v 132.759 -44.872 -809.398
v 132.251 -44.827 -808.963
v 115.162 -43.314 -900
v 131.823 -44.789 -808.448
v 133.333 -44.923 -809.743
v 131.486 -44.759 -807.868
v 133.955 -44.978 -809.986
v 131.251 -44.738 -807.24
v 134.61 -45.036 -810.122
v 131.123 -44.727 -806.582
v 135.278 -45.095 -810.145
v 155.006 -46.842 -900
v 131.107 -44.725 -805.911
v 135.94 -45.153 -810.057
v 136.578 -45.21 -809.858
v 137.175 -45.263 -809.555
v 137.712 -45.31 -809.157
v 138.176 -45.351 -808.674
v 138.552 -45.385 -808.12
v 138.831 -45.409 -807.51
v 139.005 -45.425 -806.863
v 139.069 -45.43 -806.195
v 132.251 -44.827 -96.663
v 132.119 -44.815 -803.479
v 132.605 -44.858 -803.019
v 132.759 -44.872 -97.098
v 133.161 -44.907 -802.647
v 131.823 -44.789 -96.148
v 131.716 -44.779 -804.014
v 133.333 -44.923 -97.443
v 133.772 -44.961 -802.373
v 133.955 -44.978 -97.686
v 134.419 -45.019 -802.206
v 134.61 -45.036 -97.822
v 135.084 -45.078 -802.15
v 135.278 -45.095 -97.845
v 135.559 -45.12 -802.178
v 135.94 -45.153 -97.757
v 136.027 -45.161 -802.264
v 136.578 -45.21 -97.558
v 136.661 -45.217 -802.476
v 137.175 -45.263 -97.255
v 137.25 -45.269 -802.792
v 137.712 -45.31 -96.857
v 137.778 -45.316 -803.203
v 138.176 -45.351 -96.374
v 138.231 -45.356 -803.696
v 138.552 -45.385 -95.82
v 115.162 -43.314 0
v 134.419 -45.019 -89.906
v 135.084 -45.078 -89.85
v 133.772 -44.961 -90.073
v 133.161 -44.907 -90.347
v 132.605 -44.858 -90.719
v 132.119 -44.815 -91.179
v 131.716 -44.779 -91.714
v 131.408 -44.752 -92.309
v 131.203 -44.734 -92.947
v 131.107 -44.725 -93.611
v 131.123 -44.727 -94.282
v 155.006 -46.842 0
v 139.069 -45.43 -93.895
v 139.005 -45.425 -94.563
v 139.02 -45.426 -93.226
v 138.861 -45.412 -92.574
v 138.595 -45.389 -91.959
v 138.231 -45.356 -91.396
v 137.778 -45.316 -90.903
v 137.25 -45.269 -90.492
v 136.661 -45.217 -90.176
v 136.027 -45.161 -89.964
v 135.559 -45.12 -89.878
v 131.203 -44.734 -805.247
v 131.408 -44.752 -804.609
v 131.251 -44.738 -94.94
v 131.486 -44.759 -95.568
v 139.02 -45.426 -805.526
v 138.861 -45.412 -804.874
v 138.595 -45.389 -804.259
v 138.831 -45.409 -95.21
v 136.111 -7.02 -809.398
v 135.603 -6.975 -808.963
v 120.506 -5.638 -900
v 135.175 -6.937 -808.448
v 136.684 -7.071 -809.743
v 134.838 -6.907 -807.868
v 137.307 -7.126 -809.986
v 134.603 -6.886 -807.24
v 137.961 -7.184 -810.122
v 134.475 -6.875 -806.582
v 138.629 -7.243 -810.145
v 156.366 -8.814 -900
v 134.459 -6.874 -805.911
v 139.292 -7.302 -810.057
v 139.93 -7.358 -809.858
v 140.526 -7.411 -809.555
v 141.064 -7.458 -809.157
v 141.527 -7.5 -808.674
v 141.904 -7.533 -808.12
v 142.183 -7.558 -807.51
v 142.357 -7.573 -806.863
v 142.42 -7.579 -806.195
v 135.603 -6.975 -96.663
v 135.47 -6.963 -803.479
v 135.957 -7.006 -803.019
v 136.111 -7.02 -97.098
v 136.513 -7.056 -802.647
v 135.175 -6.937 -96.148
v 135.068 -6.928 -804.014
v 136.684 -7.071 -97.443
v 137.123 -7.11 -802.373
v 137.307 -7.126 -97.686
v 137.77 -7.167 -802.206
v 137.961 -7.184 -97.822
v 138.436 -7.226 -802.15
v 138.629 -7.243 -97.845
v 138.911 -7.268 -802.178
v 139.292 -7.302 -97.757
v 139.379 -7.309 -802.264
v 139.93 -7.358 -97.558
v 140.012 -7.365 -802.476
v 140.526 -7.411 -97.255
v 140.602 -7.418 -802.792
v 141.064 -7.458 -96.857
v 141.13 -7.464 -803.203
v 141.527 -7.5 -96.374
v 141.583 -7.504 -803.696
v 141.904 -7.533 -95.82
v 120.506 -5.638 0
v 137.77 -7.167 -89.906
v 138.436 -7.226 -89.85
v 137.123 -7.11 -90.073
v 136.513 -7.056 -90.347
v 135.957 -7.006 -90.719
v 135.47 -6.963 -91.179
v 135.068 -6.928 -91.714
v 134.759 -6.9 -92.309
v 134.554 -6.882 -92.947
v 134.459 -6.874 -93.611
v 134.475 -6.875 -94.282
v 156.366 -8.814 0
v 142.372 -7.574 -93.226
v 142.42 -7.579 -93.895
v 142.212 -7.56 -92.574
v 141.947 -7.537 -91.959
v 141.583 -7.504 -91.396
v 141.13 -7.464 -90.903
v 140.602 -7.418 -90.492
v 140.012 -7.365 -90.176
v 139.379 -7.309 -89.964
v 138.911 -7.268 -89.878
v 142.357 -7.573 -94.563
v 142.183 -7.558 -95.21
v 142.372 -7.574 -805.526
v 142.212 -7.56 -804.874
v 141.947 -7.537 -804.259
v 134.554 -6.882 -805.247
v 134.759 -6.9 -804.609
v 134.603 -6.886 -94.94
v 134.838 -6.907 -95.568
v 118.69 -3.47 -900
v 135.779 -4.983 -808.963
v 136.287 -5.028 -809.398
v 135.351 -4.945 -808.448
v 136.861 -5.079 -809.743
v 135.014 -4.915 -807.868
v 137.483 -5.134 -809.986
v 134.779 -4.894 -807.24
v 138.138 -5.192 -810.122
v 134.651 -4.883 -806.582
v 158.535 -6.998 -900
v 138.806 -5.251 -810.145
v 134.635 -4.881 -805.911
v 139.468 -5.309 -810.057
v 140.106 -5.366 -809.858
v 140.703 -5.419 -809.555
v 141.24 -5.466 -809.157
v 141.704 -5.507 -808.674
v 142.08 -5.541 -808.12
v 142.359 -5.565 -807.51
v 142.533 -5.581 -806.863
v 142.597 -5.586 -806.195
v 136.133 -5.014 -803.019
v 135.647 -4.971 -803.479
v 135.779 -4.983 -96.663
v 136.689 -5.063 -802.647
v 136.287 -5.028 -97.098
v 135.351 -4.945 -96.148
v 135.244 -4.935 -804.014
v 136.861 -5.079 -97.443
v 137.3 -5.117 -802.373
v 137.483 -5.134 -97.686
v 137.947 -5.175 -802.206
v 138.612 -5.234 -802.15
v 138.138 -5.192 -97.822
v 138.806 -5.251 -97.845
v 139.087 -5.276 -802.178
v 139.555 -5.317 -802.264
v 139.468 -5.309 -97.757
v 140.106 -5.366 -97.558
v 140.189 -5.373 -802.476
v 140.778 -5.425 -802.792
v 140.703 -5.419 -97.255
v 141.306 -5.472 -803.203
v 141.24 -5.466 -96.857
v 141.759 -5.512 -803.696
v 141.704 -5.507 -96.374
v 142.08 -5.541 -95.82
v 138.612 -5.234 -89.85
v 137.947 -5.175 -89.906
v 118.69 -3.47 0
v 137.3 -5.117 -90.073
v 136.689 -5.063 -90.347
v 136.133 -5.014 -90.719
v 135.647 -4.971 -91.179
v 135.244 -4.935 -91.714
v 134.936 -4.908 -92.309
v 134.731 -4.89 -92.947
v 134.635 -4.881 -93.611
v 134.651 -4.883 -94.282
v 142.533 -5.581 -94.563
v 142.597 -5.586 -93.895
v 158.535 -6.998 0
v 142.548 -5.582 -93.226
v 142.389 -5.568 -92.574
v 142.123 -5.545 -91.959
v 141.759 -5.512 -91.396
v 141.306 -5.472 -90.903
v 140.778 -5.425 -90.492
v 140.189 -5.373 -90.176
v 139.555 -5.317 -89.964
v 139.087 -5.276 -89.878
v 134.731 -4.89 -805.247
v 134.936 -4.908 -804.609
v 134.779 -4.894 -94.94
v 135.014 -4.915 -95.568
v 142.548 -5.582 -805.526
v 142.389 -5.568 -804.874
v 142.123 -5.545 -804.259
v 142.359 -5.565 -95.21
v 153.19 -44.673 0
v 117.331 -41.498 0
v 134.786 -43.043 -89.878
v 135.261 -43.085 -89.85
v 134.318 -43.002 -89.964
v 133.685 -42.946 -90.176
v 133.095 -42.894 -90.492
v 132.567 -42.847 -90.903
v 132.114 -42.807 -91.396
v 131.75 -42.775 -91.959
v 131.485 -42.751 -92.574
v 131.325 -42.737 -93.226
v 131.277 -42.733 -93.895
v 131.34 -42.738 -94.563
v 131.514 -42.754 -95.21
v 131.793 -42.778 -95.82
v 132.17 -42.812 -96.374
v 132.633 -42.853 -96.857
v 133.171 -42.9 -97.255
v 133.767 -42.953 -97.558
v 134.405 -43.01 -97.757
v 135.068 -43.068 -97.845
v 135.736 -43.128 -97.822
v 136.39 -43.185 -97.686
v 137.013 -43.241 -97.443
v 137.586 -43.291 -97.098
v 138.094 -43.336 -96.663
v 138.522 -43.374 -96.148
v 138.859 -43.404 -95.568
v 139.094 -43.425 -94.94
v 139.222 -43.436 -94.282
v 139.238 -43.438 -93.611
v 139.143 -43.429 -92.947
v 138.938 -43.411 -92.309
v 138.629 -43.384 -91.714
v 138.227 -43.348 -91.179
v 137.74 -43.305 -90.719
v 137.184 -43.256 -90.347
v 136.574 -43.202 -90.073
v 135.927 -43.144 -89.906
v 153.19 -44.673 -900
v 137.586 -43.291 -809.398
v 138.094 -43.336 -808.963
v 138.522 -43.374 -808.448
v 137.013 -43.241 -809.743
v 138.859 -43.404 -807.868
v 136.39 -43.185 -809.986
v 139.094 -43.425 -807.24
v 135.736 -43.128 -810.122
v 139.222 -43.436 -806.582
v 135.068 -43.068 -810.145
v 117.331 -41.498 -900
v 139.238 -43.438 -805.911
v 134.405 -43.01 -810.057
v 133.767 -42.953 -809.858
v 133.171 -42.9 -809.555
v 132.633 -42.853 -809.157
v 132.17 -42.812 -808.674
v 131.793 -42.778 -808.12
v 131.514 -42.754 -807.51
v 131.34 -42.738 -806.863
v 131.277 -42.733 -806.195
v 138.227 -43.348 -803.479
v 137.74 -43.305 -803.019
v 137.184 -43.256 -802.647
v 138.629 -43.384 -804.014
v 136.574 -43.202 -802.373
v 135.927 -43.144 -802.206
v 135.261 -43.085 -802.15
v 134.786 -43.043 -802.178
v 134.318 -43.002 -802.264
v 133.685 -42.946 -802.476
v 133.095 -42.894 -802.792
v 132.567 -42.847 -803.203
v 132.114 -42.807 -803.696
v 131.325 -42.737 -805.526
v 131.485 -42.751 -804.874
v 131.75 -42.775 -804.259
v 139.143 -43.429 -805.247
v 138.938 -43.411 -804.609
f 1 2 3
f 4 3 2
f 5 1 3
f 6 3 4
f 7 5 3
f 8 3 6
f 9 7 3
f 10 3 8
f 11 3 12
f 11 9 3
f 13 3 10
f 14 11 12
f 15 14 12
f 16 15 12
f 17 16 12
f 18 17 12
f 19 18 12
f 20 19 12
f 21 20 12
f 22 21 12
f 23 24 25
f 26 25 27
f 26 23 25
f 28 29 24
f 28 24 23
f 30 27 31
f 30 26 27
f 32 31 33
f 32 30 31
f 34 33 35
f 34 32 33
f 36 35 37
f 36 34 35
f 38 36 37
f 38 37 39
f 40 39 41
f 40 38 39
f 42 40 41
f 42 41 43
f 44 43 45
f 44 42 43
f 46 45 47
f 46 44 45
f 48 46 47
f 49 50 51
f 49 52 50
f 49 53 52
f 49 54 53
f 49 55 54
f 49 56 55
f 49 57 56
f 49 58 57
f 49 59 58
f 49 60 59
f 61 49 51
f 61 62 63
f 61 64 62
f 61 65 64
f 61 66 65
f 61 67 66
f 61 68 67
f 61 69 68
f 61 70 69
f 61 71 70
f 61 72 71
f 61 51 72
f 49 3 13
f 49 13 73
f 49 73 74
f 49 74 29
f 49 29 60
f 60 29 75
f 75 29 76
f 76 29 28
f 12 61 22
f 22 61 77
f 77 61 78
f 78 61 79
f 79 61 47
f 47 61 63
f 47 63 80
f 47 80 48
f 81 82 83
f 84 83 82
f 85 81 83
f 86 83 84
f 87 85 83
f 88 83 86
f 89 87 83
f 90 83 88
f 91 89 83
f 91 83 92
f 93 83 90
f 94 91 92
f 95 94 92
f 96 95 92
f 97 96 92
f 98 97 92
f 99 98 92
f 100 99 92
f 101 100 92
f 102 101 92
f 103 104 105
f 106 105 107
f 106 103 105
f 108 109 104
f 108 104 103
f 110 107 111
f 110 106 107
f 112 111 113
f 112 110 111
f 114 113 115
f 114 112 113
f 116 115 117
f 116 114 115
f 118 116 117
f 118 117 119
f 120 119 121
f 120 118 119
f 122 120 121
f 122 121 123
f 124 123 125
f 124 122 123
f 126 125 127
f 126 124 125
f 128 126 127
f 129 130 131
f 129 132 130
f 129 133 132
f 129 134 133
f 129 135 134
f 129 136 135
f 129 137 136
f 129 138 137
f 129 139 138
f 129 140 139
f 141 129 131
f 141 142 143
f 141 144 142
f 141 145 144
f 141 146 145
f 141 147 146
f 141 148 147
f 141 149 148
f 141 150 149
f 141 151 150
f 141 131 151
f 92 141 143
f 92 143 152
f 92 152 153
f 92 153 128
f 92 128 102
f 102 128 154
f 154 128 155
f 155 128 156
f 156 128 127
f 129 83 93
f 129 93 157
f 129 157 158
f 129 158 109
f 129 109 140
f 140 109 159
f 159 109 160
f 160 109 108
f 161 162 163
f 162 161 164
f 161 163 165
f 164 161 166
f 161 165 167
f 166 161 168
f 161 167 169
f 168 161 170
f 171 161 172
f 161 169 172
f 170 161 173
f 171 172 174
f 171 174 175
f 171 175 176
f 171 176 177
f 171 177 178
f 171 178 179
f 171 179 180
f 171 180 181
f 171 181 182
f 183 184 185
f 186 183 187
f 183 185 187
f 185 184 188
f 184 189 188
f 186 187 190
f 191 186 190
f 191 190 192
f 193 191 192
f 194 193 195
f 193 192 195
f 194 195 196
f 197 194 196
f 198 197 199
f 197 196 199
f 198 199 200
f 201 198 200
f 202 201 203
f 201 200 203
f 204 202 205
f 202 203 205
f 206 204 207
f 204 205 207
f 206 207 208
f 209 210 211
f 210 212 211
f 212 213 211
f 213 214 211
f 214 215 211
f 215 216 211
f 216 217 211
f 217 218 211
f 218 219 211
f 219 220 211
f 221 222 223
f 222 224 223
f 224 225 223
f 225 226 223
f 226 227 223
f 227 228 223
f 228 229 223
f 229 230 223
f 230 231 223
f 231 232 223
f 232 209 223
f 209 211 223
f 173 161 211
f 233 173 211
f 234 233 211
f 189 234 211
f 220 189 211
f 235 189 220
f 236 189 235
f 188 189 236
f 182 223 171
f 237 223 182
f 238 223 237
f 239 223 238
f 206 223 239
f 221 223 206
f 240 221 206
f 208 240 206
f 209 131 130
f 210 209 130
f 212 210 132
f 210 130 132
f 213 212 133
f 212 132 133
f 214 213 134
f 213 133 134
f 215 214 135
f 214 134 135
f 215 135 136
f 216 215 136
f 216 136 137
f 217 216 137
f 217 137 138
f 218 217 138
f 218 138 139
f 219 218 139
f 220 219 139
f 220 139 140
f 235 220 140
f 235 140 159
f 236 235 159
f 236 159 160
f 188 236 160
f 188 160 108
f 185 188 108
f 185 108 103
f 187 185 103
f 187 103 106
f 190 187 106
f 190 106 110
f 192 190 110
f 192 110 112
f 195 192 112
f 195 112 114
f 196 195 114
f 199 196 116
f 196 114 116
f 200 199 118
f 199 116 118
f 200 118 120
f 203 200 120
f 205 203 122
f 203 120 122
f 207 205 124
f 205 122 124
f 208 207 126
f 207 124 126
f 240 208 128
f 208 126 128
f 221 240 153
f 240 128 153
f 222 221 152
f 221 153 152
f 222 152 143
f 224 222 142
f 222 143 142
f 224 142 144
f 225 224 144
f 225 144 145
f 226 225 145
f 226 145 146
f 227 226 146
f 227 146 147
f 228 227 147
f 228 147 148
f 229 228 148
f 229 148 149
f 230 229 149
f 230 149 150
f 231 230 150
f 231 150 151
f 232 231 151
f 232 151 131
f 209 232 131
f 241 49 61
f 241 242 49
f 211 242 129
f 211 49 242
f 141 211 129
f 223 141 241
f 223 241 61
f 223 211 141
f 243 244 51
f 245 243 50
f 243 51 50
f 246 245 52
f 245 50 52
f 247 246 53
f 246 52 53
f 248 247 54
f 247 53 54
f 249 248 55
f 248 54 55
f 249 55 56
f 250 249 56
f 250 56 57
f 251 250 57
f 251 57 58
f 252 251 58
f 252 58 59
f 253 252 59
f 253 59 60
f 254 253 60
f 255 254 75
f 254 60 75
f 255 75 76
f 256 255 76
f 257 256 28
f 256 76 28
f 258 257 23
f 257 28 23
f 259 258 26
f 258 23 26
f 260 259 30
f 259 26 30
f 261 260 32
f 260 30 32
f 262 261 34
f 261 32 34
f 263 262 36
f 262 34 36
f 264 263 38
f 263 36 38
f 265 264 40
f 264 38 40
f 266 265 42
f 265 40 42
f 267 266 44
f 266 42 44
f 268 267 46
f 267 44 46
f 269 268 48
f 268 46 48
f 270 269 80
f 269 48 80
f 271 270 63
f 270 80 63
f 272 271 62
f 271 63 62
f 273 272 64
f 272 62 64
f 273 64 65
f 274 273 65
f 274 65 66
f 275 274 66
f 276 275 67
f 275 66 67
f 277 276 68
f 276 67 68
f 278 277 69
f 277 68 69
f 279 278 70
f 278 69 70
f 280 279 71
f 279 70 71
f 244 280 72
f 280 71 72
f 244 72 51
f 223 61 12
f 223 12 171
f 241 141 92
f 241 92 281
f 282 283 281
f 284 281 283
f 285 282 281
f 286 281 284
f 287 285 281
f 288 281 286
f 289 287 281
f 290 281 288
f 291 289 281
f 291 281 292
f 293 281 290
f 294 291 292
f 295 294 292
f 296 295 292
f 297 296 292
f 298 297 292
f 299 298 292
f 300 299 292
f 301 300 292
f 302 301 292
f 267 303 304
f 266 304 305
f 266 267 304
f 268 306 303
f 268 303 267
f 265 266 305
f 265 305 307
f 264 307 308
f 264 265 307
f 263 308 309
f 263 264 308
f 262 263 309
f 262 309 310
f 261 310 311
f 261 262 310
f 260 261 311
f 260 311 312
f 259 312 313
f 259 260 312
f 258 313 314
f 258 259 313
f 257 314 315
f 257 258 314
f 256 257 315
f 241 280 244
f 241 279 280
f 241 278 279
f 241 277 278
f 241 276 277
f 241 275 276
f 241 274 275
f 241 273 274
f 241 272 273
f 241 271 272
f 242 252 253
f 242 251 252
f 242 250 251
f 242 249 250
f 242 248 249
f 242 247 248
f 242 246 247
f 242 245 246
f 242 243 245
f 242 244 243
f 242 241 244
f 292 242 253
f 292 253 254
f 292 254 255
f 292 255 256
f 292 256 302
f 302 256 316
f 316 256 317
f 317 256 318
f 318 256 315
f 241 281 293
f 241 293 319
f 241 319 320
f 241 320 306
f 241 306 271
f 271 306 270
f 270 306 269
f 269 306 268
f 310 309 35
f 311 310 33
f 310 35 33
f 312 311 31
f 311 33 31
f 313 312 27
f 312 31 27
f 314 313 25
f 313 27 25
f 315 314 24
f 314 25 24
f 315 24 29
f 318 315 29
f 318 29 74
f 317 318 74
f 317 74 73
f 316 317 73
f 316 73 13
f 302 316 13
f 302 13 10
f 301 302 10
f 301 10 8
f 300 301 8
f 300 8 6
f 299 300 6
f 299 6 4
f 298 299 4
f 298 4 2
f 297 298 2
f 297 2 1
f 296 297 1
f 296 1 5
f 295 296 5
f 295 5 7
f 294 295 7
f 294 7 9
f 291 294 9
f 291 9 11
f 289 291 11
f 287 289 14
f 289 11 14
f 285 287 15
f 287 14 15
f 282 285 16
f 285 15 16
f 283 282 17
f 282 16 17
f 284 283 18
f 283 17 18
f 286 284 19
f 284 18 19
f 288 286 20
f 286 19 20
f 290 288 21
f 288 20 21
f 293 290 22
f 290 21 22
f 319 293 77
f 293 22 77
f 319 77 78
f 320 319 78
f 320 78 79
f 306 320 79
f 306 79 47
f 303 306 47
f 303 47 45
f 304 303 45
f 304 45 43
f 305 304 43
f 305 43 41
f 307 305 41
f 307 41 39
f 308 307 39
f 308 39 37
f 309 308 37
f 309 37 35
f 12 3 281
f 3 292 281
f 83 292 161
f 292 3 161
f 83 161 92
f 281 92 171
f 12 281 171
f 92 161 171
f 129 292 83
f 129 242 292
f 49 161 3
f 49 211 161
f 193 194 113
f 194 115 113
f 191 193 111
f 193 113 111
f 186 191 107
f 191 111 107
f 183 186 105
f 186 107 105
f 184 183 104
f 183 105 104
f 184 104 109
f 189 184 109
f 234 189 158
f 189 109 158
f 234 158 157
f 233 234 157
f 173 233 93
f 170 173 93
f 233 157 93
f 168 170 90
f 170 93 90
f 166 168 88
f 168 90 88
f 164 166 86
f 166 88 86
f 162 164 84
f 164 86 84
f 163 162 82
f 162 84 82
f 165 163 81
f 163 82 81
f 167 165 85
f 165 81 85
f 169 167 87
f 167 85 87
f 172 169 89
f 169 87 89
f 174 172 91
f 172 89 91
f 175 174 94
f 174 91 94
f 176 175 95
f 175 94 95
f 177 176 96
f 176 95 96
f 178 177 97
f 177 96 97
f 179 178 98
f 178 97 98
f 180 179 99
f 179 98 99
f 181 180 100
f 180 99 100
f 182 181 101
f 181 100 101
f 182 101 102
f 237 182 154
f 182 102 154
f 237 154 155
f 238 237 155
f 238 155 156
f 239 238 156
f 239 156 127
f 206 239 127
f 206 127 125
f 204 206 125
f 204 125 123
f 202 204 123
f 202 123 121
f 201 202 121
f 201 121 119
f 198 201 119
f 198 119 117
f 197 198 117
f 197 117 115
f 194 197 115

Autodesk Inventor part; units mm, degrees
ref_plane "YZ Plane" through (0, 0, 0) normal (1, 0, 0) x (0, 1, 0)
ref_plane "XZ Plane" through (0, 0, 0) normal (0, 1, 0) x (-1, 0, 0)
ref_plane "XY Plane" through (0, 0, 0) normal (0, 0, 1) x (1, 0, 0)
sketch "Boceto10" plane through (0, 0, 0) normal (0, 0, 1) x (1, 0, 0)
  line L0 (93.7879, -1.2643) -> (379.7634, -26.5882)
  line L1 (93.7879, -1.2643) -> (118.6905, -3.4695)
  line L2 (118.6905, -3.4695) -> (115.1622, -43.3135)
  line L3 (115.1622, -43.3135) -> (155.0063, -46.8418)
  line L4 (155.0063, -46.8418) -> (158.5346, -6.9978)
  line L5 (158.5346, -6.9978) -> (118.6905, -3.4695)
  line L6 (156.366, -8.8135) -> (153.1905, -44.6732)
  line L7 (153.1905, -44.6732) -> (117.3308, -41.4977)
  line L8 (117.3308, -41.4977) -> (120.5063, -5.6381)
  line L9 (120.5063, -5.6381) -> (156.366, -8.8135)
  line L10 (118.6905, -3.4695) -> (115.1622, -43.3135)
  line L11 (115.1622, -43.3135) -> (155.0063, -46.8418)
  line L12 (155.0063, -46.8418) -> (158.5346, -6.9978)
  line L13 (158.5346, -6.9978) -> (118.6905, -3.4695)
  point P0 (0, 0)
  dimension "d40" = 25
  dimension "l_c" = 40
  dimension "l_c2" = 40
  dimension "l_c3" = 40
  dimension "t_c" = 2
extrude "Extrusión2" add sketch "Boceto10" against normal blind 900
sketch "Boceto12" plane through (158.5346, -6.9978, 0) normal (0.0882, 0.9961, 0) x (0.9961, -0.0882, 0)
  line L0 (-20, -27) -> (-20, 93.85)
  circle A0 centre (-20, 93.85) radius 4
  line L1 (-38, 900) -> (-2, 900) projected
  line L2 (-20, 900) -> (-20, 806.15)
  circle A1 centre (-20, 806.15) radius 4
  line L3 (-20, 93.85) -> (-20, 806.15)
  line L4 (0, 0) -> (-40, 0) projected
  line L5 (-40, 0) -> (-40, 108)
  line L6 (-40, 0) -> (-40, 900) projected
  point P0 (-158.5339, 0)
  dimension "d49" = 8
  dimension "d51" = 8
  dimension "d59" = 712.3
  dimension "d60" = 93.85
  dimension "d61" = 108
hole "Agujero1" at (138.6125, -5.2336, -93.85) at (138.6125, -5.2336, -806.15) direction (-0.0882, -0.9961, 0) diameter 8 end through all
equation "\"l_c2\" = l_c"
equation "\"l_c3\" = l_c"
properties part number "Asiento nuevo" material "Acero, suave"
